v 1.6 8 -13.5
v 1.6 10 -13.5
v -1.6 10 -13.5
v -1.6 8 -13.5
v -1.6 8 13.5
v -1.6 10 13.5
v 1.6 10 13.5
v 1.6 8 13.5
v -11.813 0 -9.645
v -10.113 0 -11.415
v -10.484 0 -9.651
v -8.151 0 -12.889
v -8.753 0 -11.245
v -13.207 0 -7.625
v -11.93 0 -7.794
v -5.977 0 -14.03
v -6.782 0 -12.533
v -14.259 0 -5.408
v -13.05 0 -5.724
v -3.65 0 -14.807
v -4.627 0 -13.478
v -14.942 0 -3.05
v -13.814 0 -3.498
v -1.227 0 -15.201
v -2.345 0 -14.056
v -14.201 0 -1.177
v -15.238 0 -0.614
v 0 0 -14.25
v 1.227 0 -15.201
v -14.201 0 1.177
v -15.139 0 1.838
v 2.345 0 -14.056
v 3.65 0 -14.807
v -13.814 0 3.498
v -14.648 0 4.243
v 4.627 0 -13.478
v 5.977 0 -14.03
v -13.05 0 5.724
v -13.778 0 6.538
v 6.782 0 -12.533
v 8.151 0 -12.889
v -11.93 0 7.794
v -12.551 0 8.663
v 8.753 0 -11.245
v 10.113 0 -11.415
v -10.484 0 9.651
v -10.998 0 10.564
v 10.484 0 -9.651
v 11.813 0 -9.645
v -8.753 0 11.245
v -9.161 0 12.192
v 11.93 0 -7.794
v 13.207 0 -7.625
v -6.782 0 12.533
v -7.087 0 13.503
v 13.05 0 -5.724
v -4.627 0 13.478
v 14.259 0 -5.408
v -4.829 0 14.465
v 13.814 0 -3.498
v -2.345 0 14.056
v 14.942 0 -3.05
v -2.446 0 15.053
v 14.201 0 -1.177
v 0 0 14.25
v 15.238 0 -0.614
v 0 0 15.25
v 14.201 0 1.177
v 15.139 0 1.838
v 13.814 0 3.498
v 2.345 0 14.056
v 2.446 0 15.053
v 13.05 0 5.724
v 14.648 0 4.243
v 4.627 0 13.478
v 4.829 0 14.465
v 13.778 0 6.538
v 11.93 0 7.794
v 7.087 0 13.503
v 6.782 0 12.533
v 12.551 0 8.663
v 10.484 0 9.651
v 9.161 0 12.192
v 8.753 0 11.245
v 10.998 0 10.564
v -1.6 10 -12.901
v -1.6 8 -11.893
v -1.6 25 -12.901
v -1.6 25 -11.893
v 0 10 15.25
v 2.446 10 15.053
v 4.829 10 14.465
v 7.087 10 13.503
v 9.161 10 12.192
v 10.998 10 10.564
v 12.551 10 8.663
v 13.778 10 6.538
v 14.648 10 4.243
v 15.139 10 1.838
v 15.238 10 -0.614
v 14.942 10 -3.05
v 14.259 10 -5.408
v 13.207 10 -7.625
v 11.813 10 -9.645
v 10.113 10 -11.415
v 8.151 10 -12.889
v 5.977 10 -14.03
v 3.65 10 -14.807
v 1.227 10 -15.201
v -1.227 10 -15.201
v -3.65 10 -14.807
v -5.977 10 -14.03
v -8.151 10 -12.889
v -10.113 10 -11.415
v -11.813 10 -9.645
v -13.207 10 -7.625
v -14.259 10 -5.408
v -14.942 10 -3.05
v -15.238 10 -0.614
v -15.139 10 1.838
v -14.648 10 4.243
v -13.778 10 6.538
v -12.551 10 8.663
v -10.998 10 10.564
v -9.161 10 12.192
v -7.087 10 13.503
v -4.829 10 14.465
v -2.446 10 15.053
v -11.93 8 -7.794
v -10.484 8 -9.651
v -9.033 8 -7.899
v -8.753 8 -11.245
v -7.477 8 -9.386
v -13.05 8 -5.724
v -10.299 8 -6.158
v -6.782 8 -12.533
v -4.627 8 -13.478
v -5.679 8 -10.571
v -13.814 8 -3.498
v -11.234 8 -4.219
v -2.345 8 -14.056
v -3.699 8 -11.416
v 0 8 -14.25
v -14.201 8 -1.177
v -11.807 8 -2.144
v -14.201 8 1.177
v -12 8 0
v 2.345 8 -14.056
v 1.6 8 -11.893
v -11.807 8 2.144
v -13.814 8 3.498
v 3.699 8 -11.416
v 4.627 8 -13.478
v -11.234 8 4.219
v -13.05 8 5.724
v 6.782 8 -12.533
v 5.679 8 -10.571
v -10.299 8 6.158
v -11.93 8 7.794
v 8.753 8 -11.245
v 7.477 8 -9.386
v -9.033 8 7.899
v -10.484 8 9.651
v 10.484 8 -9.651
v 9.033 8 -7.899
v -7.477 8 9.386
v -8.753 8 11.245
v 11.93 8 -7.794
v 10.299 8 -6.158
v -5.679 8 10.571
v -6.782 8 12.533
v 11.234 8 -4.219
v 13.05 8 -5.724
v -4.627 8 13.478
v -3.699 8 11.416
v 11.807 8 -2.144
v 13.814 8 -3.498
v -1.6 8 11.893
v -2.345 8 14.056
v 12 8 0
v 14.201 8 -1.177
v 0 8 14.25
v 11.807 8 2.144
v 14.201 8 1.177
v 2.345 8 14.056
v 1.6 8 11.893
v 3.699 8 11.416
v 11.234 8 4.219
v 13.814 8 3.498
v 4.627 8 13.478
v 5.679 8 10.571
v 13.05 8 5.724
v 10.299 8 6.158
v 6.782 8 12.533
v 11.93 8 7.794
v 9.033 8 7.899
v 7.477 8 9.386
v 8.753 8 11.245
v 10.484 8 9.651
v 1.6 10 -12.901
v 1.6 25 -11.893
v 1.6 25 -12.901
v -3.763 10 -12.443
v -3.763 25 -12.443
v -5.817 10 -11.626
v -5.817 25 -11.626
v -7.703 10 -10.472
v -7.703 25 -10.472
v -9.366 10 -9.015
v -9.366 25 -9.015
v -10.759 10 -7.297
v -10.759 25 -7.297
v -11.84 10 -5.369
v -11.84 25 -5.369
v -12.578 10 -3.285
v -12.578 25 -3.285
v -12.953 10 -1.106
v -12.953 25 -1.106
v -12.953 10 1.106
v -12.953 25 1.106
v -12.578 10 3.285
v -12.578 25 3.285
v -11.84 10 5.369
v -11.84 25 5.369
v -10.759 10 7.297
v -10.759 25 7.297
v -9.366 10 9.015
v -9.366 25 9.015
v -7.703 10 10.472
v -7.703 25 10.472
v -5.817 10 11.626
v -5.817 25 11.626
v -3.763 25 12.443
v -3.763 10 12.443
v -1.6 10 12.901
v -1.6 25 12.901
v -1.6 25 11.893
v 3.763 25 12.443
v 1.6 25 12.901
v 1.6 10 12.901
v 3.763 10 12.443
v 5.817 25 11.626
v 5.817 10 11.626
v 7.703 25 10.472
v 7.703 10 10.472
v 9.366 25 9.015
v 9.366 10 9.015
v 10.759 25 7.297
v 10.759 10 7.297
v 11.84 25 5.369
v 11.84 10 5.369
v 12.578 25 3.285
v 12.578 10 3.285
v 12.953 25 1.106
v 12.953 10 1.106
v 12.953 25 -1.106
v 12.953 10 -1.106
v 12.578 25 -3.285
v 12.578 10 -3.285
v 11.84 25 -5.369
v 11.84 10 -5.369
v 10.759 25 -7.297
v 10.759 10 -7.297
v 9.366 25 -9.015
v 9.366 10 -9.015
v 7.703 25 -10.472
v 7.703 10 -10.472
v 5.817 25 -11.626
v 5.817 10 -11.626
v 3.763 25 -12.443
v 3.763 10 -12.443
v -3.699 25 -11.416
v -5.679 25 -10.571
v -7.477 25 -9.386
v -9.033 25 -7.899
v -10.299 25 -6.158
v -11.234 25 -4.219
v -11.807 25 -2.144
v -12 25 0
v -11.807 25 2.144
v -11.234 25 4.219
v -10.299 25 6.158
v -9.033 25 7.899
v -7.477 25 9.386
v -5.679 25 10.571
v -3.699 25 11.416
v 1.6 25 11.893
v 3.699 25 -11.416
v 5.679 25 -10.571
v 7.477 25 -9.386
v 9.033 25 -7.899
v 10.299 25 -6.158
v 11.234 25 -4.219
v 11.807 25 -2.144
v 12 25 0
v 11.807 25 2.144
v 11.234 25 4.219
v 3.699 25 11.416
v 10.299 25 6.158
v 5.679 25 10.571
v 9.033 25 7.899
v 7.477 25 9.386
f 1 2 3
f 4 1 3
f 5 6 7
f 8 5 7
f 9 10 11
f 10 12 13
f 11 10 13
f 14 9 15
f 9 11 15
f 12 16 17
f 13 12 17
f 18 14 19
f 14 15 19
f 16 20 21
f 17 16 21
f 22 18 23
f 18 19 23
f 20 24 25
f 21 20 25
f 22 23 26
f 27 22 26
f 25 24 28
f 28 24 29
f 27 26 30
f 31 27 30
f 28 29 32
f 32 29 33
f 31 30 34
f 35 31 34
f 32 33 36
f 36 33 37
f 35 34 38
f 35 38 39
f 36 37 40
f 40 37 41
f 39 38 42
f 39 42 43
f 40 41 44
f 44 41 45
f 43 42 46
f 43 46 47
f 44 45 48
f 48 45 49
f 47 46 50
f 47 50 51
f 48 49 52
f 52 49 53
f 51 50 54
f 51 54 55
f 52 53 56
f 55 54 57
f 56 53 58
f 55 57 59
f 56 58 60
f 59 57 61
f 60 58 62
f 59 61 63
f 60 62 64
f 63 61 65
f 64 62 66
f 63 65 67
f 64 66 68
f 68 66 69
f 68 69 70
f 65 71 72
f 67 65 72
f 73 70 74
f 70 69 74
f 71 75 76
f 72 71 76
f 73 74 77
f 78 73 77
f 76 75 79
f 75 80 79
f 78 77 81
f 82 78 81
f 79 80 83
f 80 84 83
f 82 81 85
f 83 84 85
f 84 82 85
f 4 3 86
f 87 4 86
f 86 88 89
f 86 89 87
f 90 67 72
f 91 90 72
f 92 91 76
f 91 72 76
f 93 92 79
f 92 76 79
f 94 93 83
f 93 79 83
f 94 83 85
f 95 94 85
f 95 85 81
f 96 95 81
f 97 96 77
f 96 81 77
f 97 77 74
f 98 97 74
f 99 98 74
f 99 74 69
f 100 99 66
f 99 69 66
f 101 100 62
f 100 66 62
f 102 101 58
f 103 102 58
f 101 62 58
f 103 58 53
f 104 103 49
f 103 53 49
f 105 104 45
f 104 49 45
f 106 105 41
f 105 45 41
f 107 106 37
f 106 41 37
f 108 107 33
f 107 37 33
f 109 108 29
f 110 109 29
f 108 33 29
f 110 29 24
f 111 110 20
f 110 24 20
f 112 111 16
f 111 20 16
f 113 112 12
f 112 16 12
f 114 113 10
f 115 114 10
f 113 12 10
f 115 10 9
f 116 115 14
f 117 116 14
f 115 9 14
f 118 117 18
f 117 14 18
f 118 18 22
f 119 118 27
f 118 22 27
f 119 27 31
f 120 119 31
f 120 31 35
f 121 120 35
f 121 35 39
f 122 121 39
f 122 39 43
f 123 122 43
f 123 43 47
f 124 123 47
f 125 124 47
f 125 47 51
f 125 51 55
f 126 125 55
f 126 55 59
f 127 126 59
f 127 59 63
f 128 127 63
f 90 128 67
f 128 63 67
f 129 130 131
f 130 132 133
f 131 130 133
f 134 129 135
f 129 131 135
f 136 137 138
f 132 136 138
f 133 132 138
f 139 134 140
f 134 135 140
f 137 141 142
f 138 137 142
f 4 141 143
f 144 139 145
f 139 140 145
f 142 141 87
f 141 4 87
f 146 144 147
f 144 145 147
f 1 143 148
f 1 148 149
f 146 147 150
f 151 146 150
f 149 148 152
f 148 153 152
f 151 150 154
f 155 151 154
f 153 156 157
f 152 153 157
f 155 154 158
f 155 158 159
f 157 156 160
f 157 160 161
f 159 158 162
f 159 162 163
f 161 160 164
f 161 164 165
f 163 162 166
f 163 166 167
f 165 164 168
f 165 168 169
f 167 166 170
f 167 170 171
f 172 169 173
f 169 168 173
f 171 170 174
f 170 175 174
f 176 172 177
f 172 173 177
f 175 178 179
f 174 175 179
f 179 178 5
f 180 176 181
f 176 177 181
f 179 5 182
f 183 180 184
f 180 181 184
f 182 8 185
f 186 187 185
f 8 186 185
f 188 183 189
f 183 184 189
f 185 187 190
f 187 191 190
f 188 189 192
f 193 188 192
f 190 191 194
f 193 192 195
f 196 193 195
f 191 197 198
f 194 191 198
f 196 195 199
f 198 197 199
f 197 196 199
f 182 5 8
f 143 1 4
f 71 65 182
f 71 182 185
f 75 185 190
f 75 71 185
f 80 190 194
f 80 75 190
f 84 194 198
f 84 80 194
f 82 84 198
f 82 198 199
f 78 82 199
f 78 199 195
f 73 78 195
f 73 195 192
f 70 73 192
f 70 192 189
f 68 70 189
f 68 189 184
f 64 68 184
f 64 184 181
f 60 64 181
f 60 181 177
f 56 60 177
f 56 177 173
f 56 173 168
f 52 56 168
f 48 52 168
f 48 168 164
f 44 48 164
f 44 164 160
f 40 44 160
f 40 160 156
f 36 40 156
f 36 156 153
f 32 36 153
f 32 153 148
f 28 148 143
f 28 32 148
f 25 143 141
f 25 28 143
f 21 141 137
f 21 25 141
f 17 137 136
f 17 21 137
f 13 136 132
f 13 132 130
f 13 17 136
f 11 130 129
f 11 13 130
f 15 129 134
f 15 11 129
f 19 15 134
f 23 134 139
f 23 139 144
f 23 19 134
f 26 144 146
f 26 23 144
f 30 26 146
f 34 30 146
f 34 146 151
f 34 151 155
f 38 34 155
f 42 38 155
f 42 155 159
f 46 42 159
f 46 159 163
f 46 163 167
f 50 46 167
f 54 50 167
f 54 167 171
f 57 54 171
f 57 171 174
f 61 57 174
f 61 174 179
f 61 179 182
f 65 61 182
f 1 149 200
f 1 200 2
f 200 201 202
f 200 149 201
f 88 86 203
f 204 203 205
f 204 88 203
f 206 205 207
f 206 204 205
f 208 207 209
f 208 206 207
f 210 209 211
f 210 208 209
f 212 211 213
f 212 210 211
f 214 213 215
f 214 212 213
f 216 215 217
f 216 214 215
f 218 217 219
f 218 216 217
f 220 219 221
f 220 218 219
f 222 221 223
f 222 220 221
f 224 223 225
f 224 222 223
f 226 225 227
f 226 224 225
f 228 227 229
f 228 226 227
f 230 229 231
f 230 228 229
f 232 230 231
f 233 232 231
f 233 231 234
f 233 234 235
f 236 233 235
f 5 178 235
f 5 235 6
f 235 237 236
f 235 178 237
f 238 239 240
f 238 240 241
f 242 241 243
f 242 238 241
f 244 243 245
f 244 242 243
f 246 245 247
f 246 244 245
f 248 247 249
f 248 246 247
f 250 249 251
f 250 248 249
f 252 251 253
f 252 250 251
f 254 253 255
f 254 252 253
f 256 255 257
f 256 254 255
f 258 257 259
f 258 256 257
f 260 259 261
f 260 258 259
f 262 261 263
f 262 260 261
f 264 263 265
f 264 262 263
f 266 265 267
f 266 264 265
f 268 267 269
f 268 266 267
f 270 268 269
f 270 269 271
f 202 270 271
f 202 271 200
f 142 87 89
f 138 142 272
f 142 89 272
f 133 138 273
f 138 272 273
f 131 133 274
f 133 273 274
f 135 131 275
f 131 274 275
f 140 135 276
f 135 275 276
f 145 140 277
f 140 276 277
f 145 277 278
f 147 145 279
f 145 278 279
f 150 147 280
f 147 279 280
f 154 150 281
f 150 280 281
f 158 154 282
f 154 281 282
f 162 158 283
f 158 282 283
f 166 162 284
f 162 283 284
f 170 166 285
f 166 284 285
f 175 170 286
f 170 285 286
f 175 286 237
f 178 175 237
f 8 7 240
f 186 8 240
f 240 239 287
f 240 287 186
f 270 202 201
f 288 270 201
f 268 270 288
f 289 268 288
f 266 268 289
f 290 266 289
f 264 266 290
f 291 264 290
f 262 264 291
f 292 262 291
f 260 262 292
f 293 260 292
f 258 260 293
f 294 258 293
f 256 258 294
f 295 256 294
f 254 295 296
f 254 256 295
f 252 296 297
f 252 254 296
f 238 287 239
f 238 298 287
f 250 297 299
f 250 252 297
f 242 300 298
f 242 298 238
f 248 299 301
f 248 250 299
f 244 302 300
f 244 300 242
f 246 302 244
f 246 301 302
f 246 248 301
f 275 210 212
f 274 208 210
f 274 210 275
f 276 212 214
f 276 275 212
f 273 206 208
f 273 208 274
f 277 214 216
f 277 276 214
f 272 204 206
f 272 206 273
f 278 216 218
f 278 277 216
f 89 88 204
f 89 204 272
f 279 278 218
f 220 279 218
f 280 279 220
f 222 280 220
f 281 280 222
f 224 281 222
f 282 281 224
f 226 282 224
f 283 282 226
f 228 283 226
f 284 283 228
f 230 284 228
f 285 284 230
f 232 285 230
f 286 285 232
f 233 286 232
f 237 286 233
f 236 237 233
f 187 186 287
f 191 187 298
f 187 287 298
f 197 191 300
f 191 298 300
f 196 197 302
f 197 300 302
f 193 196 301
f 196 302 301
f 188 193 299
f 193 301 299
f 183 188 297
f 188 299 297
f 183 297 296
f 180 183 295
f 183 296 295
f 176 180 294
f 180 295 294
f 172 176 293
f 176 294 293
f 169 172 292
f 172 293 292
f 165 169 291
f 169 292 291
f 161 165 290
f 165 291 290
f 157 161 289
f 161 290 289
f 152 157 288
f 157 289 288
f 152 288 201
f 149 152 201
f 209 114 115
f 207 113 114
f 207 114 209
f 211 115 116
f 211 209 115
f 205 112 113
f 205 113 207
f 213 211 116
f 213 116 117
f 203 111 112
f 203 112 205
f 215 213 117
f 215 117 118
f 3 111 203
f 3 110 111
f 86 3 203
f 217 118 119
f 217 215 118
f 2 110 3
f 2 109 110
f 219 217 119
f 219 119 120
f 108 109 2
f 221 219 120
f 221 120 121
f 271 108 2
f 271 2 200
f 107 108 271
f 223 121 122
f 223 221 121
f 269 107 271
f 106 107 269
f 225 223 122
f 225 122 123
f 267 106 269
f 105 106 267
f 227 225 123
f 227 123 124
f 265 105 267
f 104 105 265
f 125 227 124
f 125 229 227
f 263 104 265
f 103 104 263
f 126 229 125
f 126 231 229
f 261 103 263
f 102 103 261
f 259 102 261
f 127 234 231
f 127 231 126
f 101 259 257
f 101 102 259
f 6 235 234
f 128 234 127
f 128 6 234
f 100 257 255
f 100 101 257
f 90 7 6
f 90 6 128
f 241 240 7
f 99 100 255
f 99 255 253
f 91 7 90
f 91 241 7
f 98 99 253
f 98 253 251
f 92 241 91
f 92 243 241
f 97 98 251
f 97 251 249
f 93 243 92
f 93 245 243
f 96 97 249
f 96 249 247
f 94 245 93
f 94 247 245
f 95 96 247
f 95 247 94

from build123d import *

# Parameters (mm, degrees)
SKETCH2_R           = 15.25
SKETCH2_R_2         = 14.25
BOSS_EXTRUDE1_DEPTH = 10
BOSS_EXTRUDE2_START = -2
SKETCH4_R           = 14.25
BOSS_EXTRUDE2_DEPTH = 2
SKETCH5_R           = 12
CUT_EXTRUDE1_DEPTH  = 2
BOSS_EXTRUDE4_START = 15
SKETCH6_R           = 13
SKETCH6_R_2         = 12
BOSS_EXTRUDE4_DEPTH = 15
CUT_EXTRUDE3_DEPTH  = 34.017041055


with BuildPart() as part:
    # Sketch2 → Boss-Extrude1 (new body)
    with BuildSketch(Plane(origin=(0, 0, 0), x_dir=(1, 0, 0), z_dir=(0, 1, 0))):
        with Locations(Location((0, 0, 0), (0, 0, 270))):
            Circle(SKETCH2_R)
        with Locations(Location((0, 0, 0), (0, 0, 270))):
            Circle(SKETCH2_R_2, mode=Mode.SUBTRACT)
    extrude(amount=BOSS_EXTRUDE1_DEPTH)

    # Sketch4 → Boss-Extrude2 (add)
    with BuildSketch(Plane(origin=(0, 10, 0), x_dir=(1, 0, 0), z_dir=(0, 1, 0)).offset(BOSS_EXTRUDE2_START)):
        with Locations(Location((0, 0, 0), (0, 0, 270))):
            Circle(SKETCH4_R)
    extrude(amount=BOSS_EXTRUDE2_DEPTH)

    # Sketch5 → Cut-Extrude1 (cut)
    with BuildSketch(Plane(origin=(0, 10, 0), x_dir=(1, 0, 0), z_dir=(0, 1, 0))):
        with Locations(Location((0, 0, 0), (0, 0, 270))):
            Circle(SKETCH5_R)
    extrude(amount=-CUT_EXTRUDE1_DEPTH, mode=Mode.SUBTRACT)

    # Sketch6 → Boss-Extrude4 (add)
    with BuildSketch(Plane(origin=(0, 10, 0), x_dir=(1, 0, 0), z_dir=(0, 1, 0)).offset(BOSS_EXTRUDE4_START)):
        with Locations(Location((0, 0, 0), (0, 0, 270))):
            Circle(SKETCH6_R)
        with Locations(Location((0, 0, 0), (0, 0, 270))):
            Circle(SKETCH6_R_2, mode=Mode.SUBTRACT)
    extrude(amount=-BOSS_EXTRUDE4_DEPTH)

    # Sketch7 → Cut-Extrude3 (cut, through all)
    with BuildSketch(Plane(origin=(0, 25, 0), x_dir=(1, 0, 0), z_dir=(0, 1, 0))):
        with BuildLine():
            ThreePointArc((-1.6, 12.901162738), (0, 13), (1.6, 12.901162738))
            Line((1.6, 12.901162738), (1.6, 13.5))
            Line((1.6, 13.5), (-1.6, 13.5))
            Line((-1.6, 13.5), (-1.6, 12.901162738))
        make_face()
        with BuildLine():
            ThreePointArc((-1.6, 11.892854998), (0, 12), (1.6, 11.892854998))
            Line((1.6, 11.892854998), (1.6, 12.901162738))
            ThreePointArc((1.6, 12.901162738), (0, 13), (-1.6, 12.901162738))
            Line((-1.6, 12.901162738), (-1.6, 11.892854998))
        make_face()
        with BuildLine():
            ThreePointArc((1.6, -12.901162738), (0.801524922, -12.975267157), (0, -13))
            Line((0, -13), (0, -13.5))
            Line((0, -13.5), (1.6, -13.5))
            Line((1.6, -13.5), (1.6, -12.901162738))
        make_face()
        with BuildLine():
            Line((0, -13.5), (0, -13))
            ThreePointArc((0, -13), (-0.801524922, -12.975267157), (-1.6, -12.901162738))
            Line((-1.6, -12.901162738), (-1.6, -13.5))
            Line((-1.6, -13.5), (0, -13.5))
        make_face()
        with BuildLine():
            Line((0, -13), (0, -12))
            ThreePointArc((0, -12), (-0.801791752, -11.973183787), (-1.6, -11.892854998))
            Line((-1.6, -11.892854998), (-1.6, -12.901162738))
            ThreePointArc((-1.6, -12.901162738), (-0.801524922, -12.975267157), (0, -13))
        make_face()
        with BuildLine():
            ThreePointArc((1.6, -11.892854998), (0.801791752, -11.973183787), (0, -12))
            Line((0, -12), (0, -13))
            ThreePointArc((0, -13), (0.801524922, -12.975267157), (1.6, -12.901162738))
            Line((1.6, -12.901162738), (1.6, -11.892854998))
        make_face()
    extrude(amount=-CUT_EXTRUDE3_DEPTH, mode=Mode.SUBTRACT)


solid = part.part
